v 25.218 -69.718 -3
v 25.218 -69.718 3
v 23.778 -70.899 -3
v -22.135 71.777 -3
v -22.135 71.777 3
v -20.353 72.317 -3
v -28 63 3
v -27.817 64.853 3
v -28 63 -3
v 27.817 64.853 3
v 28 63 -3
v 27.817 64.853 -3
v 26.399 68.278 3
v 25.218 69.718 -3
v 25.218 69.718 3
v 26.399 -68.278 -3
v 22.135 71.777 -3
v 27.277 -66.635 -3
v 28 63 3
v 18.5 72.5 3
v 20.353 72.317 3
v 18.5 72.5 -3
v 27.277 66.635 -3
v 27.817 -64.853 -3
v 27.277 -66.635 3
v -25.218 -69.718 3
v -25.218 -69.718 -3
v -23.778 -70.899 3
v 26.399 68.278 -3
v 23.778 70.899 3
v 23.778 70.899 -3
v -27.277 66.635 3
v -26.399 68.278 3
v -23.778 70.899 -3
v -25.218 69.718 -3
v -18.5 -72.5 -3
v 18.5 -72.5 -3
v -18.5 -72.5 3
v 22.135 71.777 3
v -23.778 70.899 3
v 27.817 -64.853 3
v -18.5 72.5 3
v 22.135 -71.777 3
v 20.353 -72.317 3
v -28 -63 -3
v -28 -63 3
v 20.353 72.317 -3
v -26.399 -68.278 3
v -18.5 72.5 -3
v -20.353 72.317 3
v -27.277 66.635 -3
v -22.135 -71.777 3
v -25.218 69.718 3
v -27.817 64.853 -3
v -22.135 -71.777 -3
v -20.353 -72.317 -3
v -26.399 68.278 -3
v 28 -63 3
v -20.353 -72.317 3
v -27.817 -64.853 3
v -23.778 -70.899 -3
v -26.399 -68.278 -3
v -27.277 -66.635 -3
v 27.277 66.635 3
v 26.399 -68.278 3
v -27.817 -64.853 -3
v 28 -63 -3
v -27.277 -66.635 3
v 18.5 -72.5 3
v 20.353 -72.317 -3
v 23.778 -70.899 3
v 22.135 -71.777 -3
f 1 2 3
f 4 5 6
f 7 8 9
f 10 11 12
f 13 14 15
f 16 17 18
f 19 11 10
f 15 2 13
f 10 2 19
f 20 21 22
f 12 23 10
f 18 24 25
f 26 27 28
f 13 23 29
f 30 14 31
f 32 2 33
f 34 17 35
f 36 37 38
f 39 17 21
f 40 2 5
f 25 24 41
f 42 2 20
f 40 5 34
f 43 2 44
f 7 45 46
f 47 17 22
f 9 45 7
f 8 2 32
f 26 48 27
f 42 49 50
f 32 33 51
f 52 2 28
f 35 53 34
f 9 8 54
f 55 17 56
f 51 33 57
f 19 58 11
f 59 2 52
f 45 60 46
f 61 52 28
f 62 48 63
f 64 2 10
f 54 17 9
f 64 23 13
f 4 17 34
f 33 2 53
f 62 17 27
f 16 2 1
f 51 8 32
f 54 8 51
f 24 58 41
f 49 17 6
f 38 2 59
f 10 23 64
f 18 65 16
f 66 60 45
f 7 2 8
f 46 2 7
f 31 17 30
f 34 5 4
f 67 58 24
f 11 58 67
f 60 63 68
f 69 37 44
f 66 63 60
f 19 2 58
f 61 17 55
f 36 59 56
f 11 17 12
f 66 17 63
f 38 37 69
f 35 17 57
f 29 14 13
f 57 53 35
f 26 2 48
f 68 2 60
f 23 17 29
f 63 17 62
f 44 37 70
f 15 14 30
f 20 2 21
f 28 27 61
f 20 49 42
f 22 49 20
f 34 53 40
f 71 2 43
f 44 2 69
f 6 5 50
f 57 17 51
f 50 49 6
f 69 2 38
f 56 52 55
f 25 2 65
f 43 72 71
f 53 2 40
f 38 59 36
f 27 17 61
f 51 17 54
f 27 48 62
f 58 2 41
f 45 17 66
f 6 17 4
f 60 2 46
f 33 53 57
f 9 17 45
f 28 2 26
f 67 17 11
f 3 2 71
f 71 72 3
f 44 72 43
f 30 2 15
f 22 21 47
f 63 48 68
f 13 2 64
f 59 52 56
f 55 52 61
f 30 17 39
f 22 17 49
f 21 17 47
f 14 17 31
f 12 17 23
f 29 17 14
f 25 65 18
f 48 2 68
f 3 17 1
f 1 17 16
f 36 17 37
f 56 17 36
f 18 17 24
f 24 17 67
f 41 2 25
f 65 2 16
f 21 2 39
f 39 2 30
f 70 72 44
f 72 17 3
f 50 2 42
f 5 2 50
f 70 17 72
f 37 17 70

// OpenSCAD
// file: smartphone.scad
echo("Работа Марата Горбушина");
len_phone = 145;
wibth_phone = 56;
thickness_phone = 6;
round_corner = 19;

//color("red")
//translate([0, 0, 10])
//cube([wibth_phone, len_phone , thickness_phone], center=true);

smartphone();

module smartphone() {
hull () {
color("red")
translate([wibth_phone/2-round_corner/2, len_phone/2-round_corner/2, 0])
cylinder(h=thickness_phone, d=round_corner, $fn=32, 
    center=true);

mirror([1,0,0])
color("red")
translate([wibth_phone/2-round_corner/2, len_phone/2-round_corner/2, 0])
cylinder(h=thickness_phone, d=round_corner, $fn=32, 
    center=true);

mirror([0,1,0])
color("red")
translate([wibth_phone/2-round_corner/2, len_phone/2-round_corner/2, 0])
cylinder(h=thickness_phone, d=round_corner, $fn=32, 
    center=true);
    
mirror([1,0,0])
mirror([0,1,0])
color("red")
translate([wibth_phone/2-round_corner/2, len_phone/2-round_corner/2, 0])
cylinder(h=thickness_phone, d=round_corner, $fn=32, 
    center=true);
}
}
// main file
use <smartphone.scad>
echo("Работа Марата Горбушина")
smartphone();
